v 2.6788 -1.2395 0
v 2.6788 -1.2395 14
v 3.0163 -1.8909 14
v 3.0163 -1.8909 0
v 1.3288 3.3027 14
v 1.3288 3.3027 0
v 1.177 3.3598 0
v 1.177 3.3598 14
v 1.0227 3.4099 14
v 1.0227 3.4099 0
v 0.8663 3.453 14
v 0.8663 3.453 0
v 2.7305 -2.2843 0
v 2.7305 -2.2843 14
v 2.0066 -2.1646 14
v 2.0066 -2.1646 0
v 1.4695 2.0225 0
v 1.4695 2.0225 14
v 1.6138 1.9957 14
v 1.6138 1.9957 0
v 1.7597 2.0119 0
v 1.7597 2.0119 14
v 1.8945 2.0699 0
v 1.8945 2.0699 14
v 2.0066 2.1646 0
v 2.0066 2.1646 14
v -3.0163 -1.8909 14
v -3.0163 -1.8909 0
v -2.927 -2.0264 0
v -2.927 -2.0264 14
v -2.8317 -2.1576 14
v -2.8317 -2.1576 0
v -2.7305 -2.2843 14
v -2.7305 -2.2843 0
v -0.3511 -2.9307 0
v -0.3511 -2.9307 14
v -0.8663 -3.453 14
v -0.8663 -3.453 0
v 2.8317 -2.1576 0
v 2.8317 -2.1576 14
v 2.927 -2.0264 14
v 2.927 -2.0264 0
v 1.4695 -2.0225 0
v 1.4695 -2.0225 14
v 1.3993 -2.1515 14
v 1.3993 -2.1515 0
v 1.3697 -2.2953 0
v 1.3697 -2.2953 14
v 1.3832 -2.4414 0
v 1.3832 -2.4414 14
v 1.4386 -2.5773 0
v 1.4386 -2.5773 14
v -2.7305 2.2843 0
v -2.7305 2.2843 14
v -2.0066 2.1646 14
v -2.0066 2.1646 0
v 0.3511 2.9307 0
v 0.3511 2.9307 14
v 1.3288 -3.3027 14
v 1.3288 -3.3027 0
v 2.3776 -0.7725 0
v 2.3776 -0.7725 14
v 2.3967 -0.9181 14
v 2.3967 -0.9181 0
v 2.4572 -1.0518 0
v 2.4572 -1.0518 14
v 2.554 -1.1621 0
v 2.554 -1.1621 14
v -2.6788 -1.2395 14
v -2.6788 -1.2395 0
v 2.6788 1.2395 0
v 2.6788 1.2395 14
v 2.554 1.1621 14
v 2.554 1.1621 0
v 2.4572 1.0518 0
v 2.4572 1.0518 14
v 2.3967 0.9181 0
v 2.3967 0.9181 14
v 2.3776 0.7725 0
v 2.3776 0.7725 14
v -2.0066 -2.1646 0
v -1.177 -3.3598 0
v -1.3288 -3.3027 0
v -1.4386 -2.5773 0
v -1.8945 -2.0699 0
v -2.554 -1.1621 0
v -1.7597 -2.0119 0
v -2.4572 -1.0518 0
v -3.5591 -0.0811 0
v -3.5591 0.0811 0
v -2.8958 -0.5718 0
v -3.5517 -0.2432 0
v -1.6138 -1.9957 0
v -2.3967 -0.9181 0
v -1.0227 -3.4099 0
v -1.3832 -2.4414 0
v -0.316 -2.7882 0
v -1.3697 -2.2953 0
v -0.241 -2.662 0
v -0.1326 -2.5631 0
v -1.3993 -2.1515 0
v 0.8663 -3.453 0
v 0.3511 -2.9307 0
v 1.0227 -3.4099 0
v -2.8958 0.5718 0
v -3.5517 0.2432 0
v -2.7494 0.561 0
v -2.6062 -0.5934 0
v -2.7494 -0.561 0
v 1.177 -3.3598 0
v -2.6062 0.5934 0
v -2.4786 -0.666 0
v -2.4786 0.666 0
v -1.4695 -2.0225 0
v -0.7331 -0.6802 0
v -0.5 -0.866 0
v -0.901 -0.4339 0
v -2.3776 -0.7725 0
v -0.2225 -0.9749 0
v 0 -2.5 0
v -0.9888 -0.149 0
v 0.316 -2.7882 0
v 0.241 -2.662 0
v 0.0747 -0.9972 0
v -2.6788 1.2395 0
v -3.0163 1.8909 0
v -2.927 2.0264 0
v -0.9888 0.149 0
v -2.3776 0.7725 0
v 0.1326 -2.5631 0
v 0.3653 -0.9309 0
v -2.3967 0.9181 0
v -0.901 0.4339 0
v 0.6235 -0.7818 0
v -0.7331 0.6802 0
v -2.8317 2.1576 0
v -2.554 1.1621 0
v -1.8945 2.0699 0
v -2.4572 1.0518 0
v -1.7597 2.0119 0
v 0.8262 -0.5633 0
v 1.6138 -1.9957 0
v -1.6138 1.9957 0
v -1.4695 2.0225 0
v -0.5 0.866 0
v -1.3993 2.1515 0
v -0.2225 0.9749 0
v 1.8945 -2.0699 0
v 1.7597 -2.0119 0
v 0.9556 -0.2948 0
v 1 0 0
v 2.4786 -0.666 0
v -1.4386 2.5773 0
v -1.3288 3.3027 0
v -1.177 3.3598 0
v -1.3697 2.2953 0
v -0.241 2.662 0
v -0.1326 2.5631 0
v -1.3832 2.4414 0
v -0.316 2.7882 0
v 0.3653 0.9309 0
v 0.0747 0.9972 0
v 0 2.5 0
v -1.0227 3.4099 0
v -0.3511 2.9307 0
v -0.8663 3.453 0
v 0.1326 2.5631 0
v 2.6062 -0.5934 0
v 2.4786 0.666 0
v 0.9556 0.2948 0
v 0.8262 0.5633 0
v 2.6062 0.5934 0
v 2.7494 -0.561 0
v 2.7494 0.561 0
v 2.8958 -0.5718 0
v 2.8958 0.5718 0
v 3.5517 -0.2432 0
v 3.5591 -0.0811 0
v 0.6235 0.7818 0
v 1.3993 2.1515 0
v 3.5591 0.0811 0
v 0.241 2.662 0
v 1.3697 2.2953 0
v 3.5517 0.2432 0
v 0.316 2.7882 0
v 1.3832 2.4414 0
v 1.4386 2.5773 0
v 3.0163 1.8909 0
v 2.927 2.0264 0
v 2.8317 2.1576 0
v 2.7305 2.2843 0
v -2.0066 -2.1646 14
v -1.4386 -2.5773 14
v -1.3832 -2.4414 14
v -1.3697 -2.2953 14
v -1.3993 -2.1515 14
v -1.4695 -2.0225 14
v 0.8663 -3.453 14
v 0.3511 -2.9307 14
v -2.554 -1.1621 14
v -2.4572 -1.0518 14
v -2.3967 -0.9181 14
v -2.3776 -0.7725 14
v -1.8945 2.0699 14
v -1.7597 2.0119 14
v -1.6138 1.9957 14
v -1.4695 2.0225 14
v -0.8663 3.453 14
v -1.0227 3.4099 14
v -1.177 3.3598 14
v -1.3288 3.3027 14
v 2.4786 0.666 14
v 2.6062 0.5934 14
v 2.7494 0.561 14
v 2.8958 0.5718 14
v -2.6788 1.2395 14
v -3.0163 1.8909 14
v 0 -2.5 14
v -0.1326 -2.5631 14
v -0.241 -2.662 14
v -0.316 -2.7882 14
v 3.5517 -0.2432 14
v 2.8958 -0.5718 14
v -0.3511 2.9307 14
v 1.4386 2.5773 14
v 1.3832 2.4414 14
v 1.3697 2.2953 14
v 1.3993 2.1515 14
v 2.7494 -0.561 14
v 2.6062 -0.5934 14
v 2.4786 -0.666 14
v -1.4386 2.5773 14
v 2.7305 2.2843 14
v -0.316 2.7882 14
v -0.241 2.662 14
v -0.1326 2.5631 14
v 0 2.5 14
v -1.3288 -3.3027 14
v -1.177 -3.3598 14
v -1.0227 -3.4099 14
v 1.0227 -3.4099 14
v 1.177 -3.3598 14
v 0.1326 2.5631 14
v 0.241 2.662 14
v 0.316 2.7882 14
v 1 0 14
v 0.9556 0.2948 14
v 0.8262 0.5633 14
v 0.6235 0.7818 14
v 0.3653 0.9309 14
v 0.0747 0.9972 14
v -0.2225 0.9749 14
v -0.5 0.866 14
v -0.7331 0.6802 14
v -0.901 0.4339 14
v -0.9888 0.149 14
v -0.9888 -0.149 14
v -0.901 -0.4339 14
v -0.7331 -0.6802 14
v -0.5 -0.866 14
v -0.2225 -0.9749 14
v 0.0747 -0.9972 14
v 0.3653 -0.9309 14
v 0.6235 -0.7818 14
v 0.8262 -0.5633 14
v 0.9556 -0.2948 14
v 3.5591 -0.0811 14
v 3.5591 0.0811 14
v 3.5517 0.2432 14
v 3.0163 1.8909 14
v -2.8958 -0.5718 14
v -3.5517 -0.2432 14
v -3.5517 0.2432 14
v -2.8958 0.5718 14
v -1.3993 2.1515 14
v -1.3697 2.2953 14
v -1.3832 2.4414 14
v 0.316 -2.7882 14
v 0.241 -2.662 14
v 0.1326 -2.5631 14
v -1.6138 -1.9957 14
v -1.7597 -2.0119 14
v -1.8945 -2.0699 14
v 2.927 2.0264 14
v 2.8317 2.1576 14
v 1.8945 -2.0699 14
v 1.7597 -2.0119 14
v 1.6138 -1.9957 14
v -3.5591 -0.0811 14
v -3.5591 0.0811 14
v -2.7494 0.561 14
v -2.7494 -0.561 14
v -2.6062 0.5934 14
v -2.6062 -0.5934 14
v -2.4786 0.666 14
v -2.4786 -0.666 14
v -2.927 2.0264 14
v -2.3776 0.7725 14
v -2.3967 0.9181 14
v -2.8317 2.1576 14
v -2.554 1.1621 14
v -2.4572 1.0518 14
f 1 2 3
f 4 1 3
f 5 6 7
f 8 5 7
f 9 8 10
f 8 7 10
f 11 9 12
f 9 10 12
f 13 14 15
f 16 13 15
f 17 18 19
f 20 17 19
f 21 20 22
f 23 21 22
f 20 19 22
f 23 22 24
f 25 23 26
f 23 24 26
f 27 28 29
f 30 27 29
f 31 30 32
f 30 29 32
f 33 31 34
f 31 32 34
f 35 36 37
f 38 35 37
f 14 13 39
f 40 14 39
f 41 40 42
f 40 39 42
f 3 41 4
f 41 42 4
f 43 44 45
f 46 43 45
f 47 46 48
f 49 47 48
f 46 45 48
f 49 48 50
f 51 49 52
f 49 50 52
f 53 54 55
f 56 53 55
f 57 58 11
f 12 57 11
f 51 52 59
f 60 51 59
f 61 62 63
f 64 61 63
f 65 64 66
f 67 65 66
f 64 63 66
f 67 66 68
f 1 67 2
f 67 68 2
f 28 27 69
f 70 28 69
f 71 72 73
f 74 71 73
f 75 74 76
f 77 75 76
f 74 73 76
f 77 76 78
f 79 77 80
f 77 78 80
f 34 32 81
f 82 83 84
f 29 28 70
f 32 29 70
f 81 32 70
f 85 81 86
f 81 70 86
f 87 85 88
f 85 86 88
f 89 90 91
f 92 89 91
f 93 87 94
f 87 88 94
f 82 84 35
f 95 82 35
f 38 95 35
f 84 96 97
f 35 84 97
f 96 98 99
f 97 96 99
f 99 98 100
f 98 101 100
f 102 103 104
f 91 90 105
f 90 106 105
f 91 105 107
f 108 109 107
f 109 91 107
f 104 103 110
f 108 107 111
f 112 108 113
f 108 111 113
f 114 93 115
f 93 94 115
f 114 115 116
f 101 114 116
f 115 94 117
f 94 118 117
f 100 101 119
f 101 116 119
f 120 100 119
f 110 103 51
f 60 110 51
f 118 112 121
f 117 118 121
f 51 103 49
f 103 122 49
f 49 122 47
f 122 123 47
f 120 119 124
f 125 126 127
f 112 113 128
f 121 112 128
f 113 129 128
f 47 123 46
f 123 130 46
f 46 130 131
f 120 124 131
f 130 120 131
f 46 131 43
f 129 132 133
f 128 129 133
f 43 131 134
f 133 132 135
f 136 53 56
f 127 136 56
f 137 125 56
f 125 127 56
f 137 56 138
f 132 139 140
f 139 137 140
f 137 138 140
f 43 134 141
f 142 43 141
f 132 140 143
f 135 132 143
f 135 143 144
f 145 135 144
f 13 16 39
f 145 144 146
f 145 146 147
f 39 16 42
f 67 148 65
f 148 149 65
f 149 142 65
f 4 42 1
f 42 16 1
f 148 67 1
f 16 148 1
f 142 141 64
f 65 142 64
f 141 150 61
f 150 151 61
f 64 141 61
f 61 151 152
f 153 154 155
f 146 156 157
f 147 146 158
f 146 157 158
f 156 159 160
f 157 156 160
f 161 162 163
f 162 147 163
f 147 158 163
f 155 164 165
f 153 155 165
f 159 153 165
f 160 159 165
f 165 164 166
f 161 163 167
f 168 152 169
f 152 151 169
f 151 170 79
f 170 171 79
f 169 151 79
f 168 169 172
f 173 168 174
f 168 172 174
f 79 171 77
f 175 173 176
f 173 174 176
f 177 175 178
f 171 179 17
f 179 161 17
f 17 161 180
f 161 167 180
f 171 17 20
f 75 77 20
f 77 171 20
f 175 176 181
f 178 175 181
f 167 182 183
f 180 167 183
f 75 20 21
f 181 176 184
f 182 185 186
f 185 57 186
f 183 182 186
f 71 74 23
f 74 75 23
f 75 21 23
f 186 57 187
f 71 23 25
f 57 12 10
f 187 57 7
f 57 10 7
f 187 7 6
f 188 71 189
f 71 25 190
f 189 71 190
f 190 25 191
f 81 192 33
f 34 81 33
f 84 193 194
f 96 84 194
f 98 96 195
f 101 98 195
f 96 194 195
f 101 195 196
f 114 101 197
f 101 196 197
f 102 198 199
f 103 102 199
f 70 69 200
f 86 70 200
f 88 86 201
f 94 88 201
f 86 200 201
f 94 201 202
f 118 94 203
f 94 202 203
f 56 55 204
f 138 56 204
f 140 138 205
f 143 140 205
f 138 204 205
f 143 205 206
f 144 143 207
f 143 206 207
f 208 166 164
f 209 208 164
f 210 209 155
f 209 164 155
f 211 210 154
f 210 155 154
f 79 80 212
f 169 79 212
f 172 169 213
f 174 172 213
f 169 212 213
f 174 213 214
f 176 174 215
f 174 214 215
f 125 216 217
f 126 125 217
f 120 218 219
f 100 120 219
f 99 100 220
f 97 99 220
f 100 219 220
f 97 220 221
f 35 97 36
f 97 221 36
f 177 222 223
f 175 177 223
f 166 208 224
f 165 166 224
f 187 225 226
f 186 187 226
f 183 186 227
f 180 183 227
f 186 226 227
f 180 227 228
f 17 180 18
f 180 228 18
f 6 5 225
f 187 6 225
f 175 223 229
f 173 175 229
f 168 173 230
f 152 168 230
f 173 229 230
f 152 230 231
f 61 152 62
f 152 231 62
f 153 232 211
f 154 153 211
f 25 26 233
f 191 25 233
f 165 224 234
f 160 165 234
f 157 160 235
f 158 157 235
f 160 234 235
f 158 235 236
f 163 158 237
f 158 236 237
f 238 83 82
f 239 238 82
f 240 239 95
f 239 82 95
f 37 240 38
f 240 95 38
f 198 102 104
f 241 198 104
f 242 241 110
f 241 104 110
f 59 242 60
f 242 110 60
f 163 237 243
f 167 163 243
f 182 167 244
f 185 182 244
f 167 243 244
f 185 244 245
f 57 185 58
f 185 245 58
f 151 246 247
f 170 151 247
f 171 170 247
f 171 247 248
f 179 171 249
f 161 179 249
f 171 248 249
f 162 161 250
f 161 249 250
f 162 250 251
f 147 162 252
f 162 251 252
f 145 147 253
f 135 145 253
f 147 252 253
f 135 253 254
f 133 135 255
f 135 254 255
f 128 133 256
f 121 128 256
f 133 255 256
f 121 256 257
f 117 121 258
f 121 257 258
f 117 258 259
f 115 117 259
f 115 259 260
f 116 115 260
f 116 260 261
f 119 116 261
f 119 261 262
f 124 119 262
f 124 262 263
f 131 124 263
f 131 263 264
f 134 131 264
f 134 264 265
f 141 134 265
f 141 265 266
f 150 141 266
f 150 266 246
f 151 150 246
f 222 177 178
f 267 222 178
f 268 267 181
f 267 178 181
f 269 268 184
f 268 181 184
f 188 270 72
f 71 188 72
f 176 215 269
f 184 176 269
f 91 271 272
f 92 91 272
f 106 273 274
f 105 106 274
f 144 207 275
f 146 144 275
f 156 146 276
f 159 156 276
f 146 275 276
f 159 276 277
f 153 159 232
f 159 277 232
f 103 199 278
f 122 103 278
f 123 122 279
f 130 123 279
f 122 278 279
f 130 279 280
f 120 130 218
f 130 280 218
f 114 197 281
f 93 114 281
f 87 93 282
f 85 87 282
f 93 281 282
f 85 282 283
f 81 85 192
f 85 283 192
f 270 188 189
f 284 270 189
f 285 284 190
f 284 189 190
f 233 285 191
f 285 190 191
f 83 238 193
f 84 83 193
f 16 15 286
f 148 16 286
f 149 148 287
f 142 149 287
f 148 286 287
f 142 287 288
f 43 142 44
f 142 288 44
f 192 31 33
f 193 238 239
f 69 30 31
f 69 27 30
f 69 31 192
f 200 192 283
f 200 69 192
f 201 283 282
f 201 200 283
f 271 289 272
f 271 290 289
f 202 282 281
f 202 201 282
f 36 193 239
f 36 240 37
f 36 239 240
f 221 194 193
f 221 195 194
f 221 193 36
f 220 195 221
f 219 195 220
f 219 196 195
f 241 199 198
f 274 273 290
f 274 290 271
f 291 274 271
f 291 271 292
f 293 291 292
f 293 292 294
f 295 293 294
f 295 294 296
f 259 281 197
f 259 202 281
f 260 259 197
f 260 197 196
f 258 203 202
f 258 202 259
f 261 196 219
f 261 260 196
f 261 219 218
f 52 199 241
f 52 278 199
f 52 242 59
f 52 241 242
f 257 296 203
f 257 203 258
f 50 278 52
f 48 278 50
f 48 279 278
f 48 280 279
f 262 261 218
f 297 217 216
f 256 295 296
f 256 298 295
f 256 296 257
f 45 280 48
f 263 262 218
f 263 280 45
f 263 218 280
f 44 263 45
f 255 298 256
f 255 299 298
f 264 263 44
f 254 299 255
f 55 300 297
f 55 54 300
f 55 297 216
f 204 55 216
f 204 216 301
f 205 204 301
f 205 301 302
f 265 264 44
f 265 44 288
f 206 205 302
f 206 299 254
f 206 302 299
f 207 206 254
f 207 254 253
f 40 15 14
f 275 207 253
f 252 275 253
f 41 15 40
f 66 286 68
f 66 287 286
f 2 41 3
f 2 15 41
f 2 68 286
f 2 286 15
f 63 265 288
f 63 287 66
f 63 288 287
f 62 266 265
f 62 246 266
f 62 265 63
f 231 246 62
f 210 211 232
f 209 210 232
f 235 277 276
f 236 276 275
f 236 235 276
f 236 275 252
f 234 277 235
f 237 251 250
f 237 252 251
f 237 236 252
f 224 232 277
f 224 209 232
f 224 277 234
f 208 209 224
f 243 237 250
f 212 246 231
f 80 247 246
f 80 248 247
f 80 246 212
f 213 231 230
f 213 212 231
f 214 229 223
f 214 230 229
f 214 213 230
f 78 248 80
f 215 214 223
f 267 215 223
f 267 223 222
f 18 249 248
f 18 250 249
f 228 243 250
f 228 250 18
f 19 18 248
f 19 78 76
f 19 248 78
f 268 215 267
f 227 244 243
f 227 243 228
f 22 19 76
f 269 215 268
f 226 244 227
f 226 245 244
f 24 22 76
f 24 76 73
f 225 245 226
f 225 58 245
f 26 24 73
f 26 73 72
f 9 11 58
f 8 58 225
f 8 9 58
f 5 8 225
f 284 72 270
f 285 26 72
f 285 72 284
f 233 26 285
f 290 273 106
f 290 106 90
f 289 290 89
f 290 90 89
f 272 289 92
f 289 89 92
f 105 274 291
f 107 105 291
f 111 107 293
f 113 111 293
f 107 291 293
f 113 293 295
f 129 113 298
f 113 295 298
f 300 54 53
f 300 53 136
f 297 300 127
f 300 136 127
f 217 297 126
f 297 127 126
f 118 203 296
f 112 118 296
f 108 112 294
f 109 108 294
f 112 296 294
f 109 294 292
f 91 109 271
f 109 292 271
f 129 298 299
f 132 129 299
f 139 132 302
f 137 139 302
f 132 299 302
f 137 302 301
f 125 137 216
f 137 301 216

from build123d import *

# Parameters (mm, degrees)
F0_R     = 3.56
F1_DEPTH = 14
F2_R     = 1
F3_DEPTH = 20.5
F5_DEPTH = 14
F6_COUNT = 10


with BuildPart() as f1:
    # F0 (on Top) → F1 (new body)
    with BuildSketch(Plane.XY):
        Circle(F0_R)
    extrude(amount=F1_DEPTH)

    # F2 (on face) → F3 (cut)
    with BuildSketch(Plane.XY.offset(14)):
        Circle(F2_R)
    extrude(amount=-F3_DEPTH, mode=Mode.SUBTRACT)

    # F4 (on face) → F5 (cut)
    with BuildSketch(Plane.XY.offset(14)):
        with BuildLine():
            ThreePointArc((-0.3510643437, 2.9307105578), (-0.2410218301, 2.6619758494), (0, 2.5))
            ThreePointArc((0, 2.5), (0.2410218301, 2.6619758494), (0.3510643437, 2.9307105578))
            Line((0.3510643437, 2.9307105578), (0.8662797764, 3.4529928104))
            ThreePointArc((0.8662797764, 3.4529928104), (0, 3.56), (-0.8662797764, 3.4529928104))
            Line((-0.8662797764, 3.4529928104), (-0.3510643437, 2.9307105578))
        make_face()
    f5 = extrude(amount=-F5_DEPTH, mode=Mode.SUBTRACT)

    # F6: F5 ×10 about axis
    f6_axis = Axis((0, 0, 0), (0, 0, -1))
    for i in range(1, F6_COUNT):
        add(f5.rotate(f6_axis, i * 360 / F6_COUNT), mode=Mode.SUBTRACT)


solid = f1.part
